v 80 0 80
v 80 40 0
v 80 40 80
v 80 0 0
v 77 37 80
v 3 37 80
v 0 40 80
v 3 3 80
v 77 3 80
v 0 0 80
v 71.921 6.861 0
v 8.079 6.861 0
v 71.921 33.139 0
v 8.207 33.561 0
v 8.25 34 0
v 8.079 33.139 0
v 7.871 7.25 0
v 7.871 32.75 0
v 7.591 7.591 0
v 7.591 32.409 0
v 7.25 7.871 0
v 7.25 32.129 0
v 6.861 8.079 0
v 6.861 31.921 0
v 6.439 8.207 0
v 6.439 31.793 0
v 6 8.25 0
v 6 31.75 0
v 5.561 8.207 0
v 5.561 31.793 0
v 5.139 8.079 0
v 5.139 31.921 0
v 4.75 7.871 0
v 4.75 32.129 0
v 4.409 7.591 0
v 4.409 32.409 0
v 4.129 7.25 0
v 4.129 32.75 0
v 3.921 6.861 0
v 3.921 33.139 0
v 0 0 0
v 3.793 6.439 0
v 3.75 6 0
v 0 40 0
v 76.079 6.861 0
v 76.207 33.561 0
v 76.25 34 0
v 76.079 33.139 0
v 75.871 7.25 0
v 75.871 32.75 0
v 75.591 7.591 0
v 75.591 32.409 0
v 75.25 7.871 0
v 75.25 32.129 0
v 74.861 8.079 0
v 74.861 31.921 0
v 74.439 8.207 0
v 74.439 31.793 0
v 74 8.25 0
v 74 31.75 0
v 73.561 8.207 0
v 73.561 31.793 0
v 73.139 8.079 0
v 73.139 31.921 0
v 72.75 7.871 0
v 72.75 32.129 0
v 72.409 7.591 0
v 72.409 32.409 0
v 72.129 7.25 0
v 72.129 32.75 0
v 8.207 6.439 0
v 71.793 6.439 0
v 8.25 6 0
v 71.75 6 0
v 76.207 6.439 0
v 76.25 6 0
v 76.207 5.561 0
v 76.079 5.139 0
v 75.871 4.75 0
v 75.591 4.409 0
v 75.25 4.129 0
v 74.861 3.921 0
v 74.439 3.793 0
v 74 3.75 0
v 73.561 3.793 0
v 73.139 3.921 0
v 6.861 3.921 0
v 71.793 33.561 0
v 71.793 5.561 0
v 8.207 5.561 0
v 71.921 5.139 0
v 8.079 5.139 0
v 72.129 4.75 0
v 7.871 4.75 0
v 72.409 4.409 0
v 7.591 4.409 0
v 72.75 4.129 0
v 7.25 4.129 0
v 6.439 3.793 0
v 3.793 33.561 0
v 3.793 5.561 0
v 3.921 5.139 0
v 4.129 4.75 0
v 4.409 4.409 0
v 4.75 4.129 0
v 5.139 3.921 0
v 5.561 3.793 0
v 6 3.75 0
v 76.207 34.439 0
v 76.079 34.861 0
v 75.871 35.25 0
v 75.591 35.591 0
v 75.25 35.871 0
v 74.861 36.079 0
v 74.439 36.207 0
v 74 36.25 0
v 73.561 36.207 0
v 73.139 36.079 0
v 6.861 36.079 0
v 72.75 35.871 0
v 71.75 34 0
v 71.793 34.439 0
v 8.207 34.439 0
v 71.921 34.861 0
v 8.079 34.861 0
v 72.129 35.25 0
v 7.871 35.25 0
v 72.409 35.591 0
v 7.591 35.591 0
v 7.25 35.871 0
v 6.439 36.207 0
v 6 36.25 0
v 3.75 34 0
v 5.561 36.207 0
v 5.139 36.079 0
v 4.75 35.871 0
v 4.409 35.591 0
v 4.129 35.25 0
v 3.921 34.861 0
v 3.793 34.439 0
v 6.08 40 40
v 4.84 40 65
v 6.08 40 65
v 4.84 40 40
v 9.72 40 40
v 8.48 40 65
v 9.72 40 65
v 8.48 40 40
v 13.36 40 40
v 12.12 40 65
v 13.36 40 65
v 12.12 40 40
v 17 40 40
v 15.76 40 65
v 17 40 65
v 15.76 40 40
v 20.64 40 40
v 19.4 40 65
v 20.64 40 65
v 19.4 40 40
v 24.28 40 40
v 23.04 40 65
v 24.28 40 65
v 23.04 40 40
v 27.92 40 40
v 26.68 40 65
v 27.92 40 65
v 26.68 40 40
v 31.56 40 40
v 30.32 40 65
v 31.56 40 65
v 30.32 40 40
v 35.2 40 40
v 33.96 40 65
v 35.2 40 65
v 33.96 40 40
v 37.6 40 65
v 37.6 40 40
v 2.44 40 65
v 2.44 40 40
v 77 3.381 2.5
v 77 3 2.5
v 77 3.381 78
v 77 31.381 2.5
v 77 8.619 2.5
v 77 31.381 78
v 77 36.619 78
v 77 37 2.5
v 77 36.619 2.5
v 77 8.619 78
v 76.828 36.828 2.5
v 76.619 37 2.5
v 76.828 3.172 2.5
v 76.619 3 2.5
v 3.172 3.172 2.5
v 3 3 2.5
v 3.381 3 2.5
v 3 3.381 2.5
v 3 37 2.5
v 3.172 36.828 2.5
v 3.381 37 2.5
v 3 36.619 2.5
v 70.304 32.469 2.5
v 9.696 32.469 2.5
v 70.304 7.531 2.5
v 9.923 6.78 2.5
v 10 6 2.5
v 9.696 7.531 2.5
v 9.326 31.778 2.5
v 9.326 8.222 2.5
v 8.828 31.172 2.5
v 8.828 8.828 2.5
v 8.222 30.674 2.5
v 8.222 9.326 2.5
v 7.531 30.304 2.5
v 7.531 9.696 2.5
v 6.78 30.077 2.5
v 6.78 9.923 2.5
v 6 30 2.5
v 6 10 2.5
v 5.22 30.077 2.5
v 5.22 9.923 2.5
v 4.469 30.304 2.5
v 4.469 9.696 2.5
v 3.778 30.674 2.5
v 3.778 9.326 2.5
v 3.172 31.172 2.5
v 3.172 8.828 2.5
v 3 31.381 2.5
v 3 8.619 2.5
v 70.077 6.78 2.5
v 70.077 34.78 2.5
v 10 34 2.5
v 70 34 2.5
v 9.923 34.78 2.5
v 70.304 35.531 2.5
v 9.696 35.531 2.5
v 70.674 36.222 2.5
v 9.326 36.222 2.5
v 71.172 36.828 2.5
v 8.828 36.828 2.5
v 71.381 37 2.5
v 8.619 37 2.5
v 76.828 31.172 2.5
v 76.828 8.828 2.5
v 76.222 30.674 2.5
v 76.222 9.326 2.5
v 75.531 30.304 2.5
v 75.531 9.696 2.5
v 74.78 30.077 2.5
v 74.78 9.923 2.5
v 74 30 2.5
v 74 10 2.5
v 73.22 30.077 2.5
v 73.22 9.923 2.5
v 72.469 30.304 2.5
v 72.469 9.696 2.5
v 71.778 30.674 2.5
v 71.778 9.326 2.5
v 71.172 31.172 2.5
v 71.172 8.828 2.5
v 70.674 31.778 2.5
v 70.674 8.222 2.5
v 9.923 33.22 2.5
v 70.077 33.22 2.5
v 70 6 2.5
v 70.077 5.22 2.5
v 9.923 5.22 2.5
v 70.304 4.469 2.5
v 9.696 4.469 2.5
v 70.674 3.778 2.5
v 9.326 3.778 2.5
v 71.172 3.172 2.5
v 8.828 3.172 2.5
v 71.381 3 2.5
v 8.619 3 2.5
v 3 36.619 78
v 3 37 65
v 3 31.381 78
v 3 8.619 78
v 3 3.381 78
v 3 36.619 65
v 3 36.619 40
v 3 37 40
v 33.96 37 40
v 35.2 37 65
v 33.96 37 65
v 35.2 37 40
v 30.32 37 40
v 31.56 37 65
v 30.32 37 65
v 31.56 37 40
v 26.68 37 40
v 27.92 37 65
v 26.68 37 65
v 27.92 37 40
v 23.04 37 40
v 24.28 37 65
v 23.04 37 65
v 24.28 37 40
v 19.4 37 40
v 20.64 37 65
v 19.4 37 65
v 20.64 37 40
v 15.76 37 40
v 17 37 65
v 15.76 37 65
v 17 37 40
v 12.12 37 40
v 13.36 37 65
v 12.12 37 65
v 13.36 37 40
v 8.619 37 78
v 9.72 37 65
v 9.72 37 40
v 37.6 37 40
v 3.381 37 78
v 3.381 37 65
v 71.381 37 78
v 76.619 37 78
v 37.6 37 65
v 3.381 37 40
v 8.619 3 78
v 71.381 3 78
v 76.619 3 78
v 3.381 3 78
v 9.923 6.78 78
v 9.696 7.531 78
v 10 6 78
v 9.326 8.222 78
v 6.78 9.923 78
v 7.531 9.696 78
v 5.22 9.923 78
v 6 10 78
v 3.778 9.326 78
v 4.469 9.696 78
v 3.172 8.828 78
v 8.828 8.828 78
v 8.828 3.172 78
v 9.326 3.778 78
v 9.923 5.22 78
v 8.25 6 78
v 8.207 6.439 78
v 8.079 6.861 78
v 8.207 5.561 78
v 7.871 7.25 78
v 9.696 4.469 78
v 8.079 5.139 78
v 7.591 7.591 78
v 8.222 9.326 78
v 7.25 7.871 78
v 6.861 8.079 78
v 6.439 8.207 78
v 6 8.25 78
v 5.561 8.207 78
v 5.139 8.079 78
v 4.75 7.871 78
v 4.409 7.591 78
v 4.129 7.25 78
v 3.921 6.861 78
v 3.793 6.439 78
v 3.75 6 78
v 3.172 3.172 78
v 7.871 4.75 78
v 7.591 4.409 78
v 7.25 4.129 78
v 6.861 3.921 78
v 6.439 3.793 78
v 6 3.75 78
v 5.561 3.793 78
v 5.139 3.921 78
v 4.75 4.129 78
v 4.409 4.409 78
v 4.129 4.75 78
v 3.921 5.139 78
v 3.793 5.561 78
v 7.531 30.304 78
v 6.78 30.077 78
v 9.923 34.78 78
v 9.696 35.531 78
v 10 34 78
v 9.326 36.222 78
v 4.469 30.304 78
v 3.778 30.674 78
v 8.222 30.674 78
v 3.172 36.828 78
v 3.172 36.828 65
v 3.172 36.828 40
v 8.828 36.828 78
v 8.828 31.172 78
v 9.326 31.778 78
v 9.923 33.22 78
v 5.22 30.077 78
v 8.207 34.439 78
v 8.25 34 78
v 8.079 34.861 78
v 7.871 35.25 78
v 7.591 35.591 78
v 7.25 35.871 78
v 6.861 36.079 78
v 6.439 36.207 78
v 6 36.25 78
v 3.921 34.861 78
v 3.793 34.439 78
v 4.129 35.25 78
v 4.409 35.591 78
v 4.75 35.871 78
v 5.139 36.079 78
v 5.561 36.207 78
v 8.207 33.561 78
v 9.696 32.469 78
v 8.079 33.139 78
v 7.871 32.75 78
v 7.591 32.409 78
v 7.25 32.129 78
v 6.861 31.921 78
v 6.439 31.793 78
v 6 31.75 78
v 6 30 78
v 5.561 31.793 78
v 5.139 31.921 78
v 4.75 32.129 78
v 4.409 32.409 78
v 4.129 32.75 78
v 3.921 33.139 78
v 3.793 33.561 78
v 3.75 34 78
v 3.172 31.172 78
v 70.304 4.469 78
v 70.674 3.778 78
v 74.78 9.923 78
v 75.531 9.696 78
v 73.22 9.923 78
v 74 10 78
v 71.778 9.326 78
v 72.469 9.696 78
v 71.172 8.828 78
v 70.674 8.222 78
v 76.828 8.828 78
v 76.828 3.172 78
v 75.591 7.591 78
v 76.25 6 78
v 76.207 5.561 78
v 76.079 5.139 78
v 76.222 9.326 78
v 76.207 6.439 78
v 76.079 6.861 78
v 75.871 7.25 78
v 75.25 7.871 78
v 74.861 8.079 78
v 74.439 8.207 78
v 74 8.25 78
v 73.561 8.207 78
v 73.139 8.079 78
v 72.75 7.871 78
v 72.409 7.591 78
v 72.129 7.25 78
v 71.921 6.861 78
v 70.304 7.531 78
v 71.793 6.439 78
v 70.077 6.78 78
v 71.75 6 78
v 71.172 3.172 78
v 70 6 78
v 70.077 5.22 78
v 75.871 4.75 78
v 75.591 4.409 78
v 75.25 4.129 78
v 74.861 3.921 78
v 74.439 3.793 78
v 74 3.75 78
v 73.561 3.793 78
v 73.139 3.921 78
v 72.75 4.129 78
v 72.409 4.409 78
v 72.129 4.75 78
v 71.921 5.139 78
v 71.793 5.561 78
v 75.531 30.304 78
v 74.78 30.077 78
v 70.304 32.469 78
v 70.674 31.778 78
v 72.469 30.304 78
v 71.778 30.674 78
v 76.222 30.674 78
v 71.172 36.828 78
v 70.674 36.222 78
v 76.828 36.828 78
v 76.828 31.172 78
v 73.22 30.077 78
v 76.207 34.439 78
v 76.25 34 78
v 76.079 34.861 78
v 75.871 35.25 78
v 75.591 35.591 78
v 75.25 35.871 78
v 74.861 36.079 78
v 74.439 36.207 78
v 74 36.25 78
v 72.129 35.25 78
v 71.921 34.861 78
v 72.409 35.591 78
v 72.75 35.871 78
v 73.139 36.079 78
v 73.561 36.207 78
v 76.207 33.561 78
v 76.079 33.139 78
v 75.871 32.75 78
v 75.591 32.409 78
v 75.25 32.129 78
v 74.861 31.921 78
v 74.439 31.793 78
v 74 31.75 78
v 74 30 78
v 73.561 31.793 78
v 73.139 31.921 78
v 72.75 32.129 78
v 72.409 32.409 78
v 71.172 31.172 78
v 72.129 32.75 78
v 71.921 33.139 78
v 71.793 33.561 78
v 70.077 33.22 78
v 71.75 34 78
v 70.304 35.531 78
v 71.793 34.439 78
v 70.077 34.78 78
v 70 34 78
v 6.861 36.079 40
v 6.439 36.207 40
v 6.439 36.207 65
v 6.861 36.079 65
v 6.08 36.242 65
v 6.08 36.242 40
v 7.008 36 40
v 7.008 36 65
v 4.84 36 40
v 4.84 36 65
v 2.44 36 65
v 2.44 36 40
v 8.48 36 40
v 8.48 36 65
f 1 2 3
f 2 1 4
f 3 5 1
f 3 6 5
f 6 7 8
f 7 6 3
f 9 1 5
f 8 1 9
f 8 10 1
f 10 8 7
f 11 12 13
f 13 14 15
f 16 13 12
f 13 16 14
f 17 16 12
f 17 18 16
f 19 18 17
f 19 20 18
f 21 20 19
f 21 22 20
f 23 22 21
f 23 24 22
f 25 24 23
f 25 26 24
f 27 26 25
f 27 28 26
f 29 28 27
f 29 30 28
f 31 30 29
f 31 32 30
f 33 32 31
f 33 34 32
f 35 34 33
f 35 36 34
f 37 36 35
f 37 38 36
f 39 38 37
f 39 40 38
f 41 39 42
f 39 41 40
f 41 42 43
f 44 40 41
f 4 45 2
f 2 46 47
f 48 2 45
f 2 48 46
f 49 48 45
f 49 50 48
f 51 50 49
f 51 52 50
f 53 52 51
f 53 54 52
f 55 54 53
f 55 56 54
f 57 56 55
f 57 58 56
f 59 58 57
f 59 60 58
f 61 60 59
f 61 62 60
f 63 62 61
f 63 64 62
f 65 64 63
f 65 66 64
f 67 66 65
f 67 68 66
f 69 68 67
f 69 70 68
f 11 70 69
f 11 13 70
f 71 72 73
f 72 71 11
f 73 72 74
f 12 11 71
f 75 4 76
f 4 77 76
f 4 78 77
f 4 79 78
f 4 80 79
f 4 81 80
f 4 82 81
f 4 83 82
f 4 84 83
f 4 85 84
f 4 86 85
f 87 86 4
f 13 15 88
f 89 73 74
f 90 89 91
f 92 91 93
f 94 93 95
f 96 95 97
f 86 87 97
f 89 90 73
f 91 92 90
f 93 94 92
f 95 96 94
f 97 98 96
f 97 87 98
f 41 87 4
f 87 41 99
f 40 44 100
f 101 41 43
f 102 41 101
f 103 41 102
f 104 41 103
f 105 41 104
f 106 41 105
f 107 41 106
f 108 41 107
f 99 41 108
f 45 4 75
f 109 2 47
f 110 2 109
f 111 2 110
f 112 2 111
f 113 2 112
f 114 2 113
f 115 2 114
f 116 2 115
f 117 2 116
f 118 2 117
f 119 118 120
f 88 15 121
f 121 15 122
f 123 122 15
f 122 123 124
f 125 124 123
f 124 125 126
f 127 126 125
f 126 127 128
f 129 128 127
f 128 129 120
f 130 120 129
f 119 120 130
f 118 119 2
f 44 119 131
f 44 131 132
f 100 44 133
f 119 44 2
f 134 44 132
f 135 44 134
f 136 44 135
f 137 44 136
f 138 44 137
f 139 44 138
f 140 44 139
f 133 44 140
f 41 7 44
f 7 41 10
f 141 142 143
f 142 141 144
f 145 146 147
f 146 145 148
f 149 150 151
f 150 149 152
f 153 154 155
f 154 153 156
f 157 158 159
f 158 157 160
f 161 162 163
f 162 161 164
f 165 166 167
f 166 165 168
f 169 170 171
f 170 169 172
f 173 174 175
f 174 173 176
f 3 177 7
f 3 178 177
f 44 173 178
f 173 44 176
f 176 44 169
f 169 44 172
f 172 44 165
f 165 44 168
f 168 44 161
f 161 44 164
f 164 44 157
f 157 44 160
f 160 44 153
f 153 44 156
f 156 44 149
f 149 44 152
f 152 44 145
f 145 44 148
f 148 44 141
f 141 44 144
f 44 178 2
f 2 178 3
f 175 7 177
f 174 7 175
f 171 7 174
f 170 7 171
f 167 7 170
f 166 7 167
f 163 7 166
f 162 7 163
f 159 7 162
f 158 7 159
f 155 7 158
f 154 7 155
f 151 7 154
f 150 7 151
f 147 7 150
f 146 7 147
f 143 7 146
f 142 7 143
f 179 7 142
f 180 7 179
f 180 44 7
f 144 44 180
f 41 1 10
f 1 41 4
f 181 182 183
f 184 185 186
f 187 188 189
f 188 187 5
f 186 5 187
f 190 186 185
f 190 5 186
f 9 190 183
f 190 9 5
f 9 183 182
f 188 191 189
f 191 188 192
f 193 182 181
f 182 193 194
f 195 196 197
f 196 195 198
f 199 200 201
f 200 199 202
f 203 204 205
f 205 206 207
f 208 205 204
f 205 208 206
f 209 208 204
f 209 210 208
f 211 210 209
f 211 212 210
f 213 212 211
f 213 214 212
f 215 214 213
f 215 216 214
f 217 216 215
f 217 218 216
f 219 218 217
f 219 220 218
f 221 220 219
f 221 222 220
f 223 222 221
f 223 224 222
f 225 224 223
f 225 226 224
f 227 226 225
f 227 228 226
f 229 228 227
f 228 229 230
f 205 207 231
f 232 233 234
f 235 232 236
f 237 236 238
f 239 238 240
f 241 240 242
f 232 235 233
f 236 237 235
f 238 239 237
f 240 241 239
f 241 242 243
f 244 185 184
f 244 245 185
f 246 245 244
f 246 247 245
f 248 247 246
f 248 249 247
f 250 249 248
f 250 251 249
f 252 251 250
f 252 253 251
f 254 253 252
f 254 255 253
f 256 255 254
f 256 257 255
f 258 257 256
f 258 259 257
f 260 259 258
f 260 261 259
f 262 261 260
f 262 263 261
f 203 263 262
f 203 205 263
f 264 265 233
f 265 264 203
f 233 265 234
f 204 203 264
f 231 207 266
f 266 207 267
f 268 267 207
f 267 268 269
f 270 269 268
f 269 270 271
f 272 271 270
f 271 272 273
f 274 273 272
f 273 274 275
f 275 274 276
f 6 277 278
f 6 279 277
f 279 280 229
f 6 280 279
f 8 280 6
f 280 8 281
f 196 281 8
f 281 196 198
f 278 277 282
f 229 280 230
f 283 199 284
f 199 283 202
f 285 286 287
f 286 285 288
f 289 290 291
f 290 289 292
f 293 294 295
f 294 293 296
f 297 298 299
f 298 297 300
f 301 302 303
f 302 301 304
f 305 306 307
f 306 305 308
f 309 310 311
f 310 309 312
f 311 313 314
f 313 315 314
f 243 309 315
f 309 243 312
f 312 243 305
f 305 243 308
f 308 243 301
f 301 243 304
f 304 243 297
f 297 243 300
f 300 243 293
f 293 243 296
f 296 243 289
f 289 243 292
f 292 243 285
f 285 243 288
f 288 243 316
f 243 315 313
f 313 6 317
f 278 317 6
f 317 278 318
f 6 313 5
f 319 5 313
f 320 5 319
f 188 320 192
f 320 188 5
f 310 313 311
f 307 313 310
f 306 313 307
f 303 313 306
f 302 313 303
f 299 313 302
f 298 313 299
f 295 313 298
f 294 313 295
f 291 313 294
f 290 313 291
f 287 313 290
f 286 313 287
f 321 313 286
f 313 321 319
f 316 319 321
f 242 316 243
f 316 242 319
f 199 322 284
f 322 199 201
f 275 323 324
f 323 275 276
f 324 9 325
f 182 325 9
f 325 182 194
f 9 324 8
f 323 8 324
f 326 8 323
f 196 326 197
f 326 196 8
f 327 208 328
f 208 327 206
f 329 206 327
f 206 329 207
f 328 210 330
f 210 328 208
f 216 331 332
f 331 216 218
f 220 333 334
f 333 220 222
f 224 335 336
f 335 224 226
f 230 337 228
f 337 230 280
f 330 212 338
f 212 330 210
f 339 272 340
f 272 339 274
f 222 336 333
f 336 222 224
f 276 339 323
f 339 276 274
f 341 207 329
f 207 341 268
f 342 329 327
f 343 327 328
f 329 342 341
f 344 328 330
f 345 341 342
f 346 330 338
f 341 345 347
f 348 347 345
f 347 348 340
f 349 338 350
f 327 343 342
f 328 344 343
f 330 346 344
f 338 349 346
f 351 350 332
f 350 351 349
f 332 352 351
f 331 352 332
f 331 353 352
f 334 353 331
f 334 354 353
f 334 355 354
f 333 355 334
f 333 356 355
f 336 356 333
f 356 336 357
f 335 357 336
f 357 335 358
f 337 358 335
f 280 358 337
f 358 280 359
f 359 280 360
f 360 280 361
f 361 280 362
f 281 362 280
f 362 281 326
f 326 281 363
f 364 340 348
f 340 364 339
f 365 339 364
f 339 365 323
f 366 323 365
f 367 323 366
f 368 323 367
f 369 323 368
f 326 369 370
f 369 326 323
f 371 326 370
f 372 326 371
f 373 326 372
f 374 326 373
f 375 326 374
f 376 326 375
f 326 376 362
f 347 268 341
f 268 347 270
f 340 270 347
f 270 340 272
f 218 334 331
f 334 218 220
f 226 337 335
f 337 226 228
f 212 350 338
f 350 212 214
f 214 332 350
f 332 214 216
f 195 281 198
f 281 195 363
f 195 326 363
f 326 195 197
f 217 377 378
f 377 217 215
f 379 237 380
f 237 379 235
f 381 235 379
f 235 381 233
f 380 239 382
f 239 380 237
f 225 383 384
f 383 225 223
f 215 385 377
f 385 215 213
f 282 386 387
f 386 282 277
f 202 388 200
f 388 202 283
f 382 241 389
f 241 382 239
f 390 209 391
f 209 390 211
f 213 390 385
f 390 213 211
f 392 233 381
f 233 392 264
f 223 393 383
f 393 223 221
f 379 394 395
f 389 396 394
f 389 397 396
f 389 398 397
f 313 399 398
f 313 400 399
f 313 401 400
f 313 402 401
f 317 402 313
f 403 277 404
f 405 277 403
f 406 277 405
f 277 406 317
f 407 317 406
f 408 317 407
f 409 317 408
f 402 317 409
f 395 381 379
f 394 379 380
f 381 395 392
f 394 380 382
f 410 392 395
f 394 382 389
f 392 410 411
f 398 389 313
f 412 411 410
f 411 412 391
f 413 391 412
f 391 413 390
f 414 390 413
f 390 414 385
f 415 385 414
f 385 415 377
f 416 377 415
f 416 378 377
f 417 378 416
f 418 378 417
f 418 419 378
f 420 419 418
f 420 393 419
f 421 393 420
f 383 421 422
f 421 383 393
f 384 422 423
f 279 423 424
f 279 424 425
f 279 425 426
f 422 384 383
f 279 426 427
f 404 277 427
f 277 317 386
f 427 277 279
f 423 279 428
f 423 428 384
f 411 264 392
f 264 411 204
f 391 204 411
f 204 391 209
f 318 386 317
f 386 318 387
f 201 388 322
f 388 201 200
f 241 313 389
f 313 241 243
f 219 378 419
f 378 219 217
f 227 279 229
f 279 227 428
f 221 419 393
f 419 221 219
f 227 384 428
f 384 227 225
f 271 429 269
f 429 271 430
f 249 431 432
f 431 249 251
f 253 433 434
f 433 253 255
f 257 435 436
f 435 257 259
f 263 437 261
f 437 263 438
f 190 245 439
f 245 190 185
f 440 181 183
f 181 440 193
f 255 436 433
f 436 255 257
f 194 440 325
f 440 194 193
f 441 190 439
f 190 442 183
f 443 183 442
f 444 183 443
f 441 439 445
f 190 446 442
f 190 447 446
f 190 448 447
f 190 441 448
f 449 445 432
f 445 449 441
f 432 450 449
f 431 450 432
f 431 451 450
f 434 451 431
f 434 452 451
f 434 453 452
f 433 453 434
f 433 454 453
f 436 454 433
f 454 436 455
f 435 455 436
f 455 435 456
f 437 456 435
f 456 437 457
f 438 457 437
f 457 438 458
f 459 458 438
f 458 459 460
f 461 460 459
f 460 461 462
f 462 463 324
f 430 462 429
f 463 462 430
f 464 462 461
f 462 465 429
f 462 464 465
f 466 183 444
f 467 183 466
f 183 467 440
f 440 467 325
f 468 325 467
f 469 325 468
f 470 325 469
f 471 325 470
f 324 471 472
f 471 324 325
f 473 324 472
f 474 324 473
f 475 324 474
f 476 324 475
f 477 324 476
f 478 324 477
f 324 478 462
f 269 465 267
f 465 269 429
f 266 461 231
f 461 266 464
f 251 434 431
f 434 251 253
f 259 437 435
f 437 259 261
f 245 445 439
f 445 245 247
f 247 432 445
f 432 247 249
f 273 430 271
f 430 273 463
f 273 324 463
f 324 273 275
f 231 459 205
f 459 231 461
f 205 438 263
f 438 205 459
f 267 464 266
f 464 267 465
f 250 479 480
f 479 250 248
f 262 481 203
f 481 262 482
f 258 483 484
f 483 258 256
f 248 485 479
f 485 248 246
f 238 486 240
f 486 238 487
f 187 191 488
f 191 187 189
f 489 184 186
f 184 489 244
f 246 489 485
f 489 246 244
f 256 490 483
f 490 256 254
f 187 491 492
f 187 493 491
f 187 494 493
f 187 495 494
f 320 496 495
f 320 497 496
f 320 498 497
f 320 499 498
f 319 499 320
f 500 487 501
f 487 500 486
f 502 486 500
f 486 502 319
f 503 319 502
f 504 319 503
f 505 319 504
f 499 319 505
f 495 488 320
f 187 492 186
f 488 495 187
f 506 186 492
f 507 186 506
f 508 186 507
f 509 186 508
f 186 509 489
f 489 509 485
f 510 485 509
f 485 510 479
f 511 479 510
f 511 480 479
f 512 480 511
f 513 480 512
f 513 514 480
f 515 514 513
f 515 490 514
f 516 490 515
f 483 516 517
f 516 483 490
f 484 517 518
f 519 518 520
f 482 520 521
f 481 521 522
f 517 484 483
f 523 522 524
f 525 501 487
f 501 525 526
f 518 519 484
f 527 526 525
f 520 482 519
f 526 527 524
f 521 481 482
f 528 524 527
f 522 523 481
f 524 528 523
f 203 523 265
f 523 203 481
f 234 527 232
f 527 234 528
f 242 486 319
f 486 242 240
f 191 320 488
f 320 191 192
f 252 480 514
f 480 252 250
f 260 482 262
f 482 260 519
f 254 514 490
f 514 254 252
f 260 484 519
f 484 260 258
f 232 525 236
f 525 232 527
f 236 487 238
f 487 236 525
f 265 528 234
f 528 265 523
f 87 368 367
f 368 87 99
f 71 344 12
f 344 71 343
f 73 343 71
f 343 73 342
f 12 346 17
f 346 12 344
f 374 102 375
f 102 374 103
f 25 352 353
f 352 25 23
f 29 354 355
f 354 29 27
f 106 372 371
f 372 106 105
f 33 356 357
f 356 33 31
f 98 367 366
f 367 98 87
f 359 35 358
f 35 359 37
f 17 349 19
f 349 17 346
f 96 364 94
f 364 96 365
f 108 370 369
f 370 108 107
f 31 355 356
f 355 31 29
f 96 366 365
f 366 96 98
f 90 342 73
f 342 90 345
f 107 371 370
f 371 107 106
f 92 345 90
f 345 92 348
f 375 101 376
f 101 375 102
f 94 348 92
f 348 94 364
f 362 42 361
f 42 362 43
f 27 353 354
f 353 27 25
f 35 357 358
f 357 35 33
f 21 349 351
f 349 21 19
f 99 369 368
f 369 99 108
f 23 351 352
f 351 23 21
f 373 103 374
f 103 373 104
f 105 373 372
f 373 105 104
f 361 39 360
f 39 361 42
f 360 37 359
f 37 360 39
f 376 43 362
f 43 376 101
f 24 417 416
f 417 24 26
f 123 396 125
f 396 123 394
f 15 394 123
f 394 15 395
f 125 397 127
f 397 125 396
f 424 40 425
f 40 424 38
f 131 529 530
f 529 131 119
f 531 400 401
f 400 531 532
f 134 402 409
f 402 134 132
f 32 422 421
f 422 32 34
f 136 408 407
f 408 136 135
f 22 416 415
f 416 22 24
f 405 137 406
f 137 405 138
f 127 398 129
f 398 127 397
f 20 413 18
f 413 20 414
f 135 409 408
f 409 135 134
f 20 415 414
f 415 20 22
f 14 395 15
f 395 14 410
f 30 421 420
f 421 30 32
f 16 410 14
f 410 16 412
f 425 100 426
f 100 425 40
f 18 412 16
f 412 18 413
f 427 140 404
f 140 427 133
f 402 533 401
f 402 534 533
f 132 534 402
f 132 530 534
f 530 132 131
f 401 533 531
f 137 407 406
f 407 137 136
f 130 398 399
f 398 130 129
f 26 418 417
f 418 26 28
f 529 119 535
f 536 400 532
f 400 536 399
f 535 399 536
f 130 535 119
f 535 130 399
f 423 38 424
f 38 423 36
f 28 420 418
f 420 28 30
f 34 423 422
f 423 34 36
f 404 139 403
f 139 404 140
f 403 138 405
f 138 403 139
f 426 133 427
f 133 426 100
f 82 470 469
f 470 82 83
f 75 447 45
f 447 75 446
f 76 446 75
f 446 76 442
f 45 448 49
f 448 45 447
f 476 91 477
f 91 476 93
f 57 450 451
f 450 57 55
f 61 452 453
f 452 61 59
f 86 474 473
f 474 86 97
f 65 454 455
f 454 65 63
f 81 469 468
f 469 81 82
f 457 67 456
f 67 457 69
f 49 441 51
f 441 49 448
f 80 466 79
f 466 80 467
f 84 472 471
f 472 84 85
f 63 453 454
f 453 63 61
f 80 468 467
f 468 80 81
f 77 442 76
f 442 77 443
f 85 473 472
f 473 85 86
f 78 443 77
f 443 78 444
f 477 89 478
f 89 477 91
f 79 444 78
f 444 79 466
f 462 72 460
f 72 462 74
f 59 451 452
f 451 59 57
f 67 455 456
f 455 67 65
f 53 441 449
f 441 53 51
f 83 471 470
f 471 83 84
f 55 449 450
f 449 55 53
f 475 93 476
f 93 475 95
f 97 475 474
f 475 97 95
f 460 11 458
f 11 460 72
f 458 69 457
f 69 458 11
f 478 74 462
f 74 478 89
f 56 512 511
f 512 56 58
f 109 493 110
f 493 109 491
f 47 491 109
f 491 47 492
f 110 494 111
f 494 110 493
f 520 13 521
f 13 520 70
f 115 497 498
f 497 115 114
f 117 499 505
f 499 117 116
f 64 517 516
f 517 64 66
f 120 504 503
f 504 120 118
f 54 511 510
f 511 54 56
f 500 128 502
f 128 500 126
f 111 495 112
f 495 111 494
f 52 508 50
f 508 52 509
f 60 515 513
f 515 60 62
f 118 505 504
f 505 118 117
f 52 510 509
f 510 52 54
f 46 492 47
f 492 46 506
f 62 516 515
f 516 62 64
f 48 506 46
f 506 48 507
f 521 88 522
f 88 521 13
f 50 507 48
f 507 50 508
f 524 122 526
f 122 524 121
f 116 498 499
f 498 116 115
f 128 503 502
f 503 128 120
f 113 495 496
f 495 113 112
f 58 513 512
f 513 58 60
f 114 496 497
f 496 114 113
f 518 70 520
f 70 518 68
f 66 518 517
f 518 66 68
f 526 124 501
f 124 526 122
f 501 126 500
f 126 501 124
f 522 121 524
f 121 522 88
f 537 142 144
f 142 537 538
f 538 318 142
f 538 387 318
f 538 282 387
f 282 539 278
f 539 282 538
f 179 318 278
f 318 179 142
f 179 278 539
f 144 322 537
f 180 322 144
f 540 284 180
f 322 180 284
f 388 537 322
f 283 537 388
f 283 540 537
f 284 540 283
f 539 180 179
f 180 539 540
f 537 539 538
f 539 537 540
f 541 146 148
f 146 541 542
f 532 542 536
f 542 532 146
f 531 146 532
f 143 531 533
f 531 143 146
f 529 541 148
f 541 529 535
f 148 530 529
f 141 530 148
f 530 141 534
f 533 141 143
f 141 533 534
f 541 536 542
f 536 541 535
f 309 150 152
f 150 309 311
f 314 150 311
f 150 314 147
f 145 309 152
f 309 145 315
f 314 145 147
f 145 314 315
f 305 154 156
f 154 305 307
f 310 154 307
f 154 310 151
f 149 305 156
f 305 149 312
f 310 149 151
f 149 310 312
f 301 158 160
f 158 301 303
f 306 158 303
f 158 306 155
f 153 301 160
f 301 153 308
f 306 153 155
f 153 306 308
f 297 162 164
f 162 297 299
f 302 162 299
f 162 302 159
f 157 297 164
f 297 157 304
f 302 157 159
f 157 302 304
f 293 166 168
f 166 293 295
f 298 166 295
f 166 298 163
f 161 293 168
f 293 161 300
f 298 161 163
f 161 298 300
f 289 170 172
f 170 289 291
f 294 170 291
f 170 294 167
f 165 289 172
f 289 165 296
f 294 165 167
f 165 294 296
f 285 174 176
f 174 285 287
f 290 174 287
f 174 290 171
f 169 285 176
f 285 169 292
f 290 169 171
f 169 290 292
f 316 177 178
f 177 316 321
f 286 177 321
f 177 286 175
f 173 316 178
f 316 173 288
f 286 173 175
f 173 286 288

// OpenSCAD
$fn = 32;

// ----------------------------------------------------------------------
// Enclosure body: 80 x 40 x 80 mm, wall 3 mm
// ----------------------------------------------------------------------

// --- parameters (mm) ---
length = 80;              // outside length, X
width = 40;               // outside width, Y
height = 80;              // outside height, Z
wall = 3;                 // side wall thickness
floor_t = 2.5;            // floor thickness
boss_d = 8;               // corner boss diameter
boss_h = 75.5;            // corner boss height above the floor
boss_hole_d = 4.5;        // lid screw clearance in the boss
boss_lip = 6;             // boss centre inset from the corner
vent_slots = 10;          // vent slots in the long wall
vent_w = 2.4;             // vent slot width
vent_h = 25;              // vent slot height
vent_pitch = 3.64;        // vent slot pitch
vent_z = 40;              // vent slot sill height

module shell() {
  difference() {
    cube([length, width, height]);
    /* hollow, open at the top */
    translate([wall, wall, floor_t])
      cube([length - 2 * wall, width - 2 * wall, height]);
  }
}

module bosses() {
  /* corner bosses, sunk 1 mm into the floor */
  for (sx = [0, 1]) for (sy = [0, 1])
    translate([sx * (length - 2 * boss_lip) + boss_lip, sy * (width - 2 * boss_lip) + boss_lip, floor_t - 1])
      cylinder(h = boss_h + 1, d = boss_d);
}

difference() {
  union() {
    shell();
    bosses();
  }
  /* boss screw holes */
  for (sx = [0, 1]) for (sy = [0, 1])
    translate([sx * (length - 2 * boss_lip) + boss_lip, sy * (width - 2 * boss_lip) + boss_lip, -1]) cylinder(h = floor_t + boss_h + 2, d = boss_hole_d);
  /* vent grille in the +Y wall */
  for (i = [0 : vent_slots - 1]) translate([vent_pitch * (i + 1) - vent_w / 2, width - wall - 1, vent_z]) cube([vent_w, wall + 2, vent_h]);
}
